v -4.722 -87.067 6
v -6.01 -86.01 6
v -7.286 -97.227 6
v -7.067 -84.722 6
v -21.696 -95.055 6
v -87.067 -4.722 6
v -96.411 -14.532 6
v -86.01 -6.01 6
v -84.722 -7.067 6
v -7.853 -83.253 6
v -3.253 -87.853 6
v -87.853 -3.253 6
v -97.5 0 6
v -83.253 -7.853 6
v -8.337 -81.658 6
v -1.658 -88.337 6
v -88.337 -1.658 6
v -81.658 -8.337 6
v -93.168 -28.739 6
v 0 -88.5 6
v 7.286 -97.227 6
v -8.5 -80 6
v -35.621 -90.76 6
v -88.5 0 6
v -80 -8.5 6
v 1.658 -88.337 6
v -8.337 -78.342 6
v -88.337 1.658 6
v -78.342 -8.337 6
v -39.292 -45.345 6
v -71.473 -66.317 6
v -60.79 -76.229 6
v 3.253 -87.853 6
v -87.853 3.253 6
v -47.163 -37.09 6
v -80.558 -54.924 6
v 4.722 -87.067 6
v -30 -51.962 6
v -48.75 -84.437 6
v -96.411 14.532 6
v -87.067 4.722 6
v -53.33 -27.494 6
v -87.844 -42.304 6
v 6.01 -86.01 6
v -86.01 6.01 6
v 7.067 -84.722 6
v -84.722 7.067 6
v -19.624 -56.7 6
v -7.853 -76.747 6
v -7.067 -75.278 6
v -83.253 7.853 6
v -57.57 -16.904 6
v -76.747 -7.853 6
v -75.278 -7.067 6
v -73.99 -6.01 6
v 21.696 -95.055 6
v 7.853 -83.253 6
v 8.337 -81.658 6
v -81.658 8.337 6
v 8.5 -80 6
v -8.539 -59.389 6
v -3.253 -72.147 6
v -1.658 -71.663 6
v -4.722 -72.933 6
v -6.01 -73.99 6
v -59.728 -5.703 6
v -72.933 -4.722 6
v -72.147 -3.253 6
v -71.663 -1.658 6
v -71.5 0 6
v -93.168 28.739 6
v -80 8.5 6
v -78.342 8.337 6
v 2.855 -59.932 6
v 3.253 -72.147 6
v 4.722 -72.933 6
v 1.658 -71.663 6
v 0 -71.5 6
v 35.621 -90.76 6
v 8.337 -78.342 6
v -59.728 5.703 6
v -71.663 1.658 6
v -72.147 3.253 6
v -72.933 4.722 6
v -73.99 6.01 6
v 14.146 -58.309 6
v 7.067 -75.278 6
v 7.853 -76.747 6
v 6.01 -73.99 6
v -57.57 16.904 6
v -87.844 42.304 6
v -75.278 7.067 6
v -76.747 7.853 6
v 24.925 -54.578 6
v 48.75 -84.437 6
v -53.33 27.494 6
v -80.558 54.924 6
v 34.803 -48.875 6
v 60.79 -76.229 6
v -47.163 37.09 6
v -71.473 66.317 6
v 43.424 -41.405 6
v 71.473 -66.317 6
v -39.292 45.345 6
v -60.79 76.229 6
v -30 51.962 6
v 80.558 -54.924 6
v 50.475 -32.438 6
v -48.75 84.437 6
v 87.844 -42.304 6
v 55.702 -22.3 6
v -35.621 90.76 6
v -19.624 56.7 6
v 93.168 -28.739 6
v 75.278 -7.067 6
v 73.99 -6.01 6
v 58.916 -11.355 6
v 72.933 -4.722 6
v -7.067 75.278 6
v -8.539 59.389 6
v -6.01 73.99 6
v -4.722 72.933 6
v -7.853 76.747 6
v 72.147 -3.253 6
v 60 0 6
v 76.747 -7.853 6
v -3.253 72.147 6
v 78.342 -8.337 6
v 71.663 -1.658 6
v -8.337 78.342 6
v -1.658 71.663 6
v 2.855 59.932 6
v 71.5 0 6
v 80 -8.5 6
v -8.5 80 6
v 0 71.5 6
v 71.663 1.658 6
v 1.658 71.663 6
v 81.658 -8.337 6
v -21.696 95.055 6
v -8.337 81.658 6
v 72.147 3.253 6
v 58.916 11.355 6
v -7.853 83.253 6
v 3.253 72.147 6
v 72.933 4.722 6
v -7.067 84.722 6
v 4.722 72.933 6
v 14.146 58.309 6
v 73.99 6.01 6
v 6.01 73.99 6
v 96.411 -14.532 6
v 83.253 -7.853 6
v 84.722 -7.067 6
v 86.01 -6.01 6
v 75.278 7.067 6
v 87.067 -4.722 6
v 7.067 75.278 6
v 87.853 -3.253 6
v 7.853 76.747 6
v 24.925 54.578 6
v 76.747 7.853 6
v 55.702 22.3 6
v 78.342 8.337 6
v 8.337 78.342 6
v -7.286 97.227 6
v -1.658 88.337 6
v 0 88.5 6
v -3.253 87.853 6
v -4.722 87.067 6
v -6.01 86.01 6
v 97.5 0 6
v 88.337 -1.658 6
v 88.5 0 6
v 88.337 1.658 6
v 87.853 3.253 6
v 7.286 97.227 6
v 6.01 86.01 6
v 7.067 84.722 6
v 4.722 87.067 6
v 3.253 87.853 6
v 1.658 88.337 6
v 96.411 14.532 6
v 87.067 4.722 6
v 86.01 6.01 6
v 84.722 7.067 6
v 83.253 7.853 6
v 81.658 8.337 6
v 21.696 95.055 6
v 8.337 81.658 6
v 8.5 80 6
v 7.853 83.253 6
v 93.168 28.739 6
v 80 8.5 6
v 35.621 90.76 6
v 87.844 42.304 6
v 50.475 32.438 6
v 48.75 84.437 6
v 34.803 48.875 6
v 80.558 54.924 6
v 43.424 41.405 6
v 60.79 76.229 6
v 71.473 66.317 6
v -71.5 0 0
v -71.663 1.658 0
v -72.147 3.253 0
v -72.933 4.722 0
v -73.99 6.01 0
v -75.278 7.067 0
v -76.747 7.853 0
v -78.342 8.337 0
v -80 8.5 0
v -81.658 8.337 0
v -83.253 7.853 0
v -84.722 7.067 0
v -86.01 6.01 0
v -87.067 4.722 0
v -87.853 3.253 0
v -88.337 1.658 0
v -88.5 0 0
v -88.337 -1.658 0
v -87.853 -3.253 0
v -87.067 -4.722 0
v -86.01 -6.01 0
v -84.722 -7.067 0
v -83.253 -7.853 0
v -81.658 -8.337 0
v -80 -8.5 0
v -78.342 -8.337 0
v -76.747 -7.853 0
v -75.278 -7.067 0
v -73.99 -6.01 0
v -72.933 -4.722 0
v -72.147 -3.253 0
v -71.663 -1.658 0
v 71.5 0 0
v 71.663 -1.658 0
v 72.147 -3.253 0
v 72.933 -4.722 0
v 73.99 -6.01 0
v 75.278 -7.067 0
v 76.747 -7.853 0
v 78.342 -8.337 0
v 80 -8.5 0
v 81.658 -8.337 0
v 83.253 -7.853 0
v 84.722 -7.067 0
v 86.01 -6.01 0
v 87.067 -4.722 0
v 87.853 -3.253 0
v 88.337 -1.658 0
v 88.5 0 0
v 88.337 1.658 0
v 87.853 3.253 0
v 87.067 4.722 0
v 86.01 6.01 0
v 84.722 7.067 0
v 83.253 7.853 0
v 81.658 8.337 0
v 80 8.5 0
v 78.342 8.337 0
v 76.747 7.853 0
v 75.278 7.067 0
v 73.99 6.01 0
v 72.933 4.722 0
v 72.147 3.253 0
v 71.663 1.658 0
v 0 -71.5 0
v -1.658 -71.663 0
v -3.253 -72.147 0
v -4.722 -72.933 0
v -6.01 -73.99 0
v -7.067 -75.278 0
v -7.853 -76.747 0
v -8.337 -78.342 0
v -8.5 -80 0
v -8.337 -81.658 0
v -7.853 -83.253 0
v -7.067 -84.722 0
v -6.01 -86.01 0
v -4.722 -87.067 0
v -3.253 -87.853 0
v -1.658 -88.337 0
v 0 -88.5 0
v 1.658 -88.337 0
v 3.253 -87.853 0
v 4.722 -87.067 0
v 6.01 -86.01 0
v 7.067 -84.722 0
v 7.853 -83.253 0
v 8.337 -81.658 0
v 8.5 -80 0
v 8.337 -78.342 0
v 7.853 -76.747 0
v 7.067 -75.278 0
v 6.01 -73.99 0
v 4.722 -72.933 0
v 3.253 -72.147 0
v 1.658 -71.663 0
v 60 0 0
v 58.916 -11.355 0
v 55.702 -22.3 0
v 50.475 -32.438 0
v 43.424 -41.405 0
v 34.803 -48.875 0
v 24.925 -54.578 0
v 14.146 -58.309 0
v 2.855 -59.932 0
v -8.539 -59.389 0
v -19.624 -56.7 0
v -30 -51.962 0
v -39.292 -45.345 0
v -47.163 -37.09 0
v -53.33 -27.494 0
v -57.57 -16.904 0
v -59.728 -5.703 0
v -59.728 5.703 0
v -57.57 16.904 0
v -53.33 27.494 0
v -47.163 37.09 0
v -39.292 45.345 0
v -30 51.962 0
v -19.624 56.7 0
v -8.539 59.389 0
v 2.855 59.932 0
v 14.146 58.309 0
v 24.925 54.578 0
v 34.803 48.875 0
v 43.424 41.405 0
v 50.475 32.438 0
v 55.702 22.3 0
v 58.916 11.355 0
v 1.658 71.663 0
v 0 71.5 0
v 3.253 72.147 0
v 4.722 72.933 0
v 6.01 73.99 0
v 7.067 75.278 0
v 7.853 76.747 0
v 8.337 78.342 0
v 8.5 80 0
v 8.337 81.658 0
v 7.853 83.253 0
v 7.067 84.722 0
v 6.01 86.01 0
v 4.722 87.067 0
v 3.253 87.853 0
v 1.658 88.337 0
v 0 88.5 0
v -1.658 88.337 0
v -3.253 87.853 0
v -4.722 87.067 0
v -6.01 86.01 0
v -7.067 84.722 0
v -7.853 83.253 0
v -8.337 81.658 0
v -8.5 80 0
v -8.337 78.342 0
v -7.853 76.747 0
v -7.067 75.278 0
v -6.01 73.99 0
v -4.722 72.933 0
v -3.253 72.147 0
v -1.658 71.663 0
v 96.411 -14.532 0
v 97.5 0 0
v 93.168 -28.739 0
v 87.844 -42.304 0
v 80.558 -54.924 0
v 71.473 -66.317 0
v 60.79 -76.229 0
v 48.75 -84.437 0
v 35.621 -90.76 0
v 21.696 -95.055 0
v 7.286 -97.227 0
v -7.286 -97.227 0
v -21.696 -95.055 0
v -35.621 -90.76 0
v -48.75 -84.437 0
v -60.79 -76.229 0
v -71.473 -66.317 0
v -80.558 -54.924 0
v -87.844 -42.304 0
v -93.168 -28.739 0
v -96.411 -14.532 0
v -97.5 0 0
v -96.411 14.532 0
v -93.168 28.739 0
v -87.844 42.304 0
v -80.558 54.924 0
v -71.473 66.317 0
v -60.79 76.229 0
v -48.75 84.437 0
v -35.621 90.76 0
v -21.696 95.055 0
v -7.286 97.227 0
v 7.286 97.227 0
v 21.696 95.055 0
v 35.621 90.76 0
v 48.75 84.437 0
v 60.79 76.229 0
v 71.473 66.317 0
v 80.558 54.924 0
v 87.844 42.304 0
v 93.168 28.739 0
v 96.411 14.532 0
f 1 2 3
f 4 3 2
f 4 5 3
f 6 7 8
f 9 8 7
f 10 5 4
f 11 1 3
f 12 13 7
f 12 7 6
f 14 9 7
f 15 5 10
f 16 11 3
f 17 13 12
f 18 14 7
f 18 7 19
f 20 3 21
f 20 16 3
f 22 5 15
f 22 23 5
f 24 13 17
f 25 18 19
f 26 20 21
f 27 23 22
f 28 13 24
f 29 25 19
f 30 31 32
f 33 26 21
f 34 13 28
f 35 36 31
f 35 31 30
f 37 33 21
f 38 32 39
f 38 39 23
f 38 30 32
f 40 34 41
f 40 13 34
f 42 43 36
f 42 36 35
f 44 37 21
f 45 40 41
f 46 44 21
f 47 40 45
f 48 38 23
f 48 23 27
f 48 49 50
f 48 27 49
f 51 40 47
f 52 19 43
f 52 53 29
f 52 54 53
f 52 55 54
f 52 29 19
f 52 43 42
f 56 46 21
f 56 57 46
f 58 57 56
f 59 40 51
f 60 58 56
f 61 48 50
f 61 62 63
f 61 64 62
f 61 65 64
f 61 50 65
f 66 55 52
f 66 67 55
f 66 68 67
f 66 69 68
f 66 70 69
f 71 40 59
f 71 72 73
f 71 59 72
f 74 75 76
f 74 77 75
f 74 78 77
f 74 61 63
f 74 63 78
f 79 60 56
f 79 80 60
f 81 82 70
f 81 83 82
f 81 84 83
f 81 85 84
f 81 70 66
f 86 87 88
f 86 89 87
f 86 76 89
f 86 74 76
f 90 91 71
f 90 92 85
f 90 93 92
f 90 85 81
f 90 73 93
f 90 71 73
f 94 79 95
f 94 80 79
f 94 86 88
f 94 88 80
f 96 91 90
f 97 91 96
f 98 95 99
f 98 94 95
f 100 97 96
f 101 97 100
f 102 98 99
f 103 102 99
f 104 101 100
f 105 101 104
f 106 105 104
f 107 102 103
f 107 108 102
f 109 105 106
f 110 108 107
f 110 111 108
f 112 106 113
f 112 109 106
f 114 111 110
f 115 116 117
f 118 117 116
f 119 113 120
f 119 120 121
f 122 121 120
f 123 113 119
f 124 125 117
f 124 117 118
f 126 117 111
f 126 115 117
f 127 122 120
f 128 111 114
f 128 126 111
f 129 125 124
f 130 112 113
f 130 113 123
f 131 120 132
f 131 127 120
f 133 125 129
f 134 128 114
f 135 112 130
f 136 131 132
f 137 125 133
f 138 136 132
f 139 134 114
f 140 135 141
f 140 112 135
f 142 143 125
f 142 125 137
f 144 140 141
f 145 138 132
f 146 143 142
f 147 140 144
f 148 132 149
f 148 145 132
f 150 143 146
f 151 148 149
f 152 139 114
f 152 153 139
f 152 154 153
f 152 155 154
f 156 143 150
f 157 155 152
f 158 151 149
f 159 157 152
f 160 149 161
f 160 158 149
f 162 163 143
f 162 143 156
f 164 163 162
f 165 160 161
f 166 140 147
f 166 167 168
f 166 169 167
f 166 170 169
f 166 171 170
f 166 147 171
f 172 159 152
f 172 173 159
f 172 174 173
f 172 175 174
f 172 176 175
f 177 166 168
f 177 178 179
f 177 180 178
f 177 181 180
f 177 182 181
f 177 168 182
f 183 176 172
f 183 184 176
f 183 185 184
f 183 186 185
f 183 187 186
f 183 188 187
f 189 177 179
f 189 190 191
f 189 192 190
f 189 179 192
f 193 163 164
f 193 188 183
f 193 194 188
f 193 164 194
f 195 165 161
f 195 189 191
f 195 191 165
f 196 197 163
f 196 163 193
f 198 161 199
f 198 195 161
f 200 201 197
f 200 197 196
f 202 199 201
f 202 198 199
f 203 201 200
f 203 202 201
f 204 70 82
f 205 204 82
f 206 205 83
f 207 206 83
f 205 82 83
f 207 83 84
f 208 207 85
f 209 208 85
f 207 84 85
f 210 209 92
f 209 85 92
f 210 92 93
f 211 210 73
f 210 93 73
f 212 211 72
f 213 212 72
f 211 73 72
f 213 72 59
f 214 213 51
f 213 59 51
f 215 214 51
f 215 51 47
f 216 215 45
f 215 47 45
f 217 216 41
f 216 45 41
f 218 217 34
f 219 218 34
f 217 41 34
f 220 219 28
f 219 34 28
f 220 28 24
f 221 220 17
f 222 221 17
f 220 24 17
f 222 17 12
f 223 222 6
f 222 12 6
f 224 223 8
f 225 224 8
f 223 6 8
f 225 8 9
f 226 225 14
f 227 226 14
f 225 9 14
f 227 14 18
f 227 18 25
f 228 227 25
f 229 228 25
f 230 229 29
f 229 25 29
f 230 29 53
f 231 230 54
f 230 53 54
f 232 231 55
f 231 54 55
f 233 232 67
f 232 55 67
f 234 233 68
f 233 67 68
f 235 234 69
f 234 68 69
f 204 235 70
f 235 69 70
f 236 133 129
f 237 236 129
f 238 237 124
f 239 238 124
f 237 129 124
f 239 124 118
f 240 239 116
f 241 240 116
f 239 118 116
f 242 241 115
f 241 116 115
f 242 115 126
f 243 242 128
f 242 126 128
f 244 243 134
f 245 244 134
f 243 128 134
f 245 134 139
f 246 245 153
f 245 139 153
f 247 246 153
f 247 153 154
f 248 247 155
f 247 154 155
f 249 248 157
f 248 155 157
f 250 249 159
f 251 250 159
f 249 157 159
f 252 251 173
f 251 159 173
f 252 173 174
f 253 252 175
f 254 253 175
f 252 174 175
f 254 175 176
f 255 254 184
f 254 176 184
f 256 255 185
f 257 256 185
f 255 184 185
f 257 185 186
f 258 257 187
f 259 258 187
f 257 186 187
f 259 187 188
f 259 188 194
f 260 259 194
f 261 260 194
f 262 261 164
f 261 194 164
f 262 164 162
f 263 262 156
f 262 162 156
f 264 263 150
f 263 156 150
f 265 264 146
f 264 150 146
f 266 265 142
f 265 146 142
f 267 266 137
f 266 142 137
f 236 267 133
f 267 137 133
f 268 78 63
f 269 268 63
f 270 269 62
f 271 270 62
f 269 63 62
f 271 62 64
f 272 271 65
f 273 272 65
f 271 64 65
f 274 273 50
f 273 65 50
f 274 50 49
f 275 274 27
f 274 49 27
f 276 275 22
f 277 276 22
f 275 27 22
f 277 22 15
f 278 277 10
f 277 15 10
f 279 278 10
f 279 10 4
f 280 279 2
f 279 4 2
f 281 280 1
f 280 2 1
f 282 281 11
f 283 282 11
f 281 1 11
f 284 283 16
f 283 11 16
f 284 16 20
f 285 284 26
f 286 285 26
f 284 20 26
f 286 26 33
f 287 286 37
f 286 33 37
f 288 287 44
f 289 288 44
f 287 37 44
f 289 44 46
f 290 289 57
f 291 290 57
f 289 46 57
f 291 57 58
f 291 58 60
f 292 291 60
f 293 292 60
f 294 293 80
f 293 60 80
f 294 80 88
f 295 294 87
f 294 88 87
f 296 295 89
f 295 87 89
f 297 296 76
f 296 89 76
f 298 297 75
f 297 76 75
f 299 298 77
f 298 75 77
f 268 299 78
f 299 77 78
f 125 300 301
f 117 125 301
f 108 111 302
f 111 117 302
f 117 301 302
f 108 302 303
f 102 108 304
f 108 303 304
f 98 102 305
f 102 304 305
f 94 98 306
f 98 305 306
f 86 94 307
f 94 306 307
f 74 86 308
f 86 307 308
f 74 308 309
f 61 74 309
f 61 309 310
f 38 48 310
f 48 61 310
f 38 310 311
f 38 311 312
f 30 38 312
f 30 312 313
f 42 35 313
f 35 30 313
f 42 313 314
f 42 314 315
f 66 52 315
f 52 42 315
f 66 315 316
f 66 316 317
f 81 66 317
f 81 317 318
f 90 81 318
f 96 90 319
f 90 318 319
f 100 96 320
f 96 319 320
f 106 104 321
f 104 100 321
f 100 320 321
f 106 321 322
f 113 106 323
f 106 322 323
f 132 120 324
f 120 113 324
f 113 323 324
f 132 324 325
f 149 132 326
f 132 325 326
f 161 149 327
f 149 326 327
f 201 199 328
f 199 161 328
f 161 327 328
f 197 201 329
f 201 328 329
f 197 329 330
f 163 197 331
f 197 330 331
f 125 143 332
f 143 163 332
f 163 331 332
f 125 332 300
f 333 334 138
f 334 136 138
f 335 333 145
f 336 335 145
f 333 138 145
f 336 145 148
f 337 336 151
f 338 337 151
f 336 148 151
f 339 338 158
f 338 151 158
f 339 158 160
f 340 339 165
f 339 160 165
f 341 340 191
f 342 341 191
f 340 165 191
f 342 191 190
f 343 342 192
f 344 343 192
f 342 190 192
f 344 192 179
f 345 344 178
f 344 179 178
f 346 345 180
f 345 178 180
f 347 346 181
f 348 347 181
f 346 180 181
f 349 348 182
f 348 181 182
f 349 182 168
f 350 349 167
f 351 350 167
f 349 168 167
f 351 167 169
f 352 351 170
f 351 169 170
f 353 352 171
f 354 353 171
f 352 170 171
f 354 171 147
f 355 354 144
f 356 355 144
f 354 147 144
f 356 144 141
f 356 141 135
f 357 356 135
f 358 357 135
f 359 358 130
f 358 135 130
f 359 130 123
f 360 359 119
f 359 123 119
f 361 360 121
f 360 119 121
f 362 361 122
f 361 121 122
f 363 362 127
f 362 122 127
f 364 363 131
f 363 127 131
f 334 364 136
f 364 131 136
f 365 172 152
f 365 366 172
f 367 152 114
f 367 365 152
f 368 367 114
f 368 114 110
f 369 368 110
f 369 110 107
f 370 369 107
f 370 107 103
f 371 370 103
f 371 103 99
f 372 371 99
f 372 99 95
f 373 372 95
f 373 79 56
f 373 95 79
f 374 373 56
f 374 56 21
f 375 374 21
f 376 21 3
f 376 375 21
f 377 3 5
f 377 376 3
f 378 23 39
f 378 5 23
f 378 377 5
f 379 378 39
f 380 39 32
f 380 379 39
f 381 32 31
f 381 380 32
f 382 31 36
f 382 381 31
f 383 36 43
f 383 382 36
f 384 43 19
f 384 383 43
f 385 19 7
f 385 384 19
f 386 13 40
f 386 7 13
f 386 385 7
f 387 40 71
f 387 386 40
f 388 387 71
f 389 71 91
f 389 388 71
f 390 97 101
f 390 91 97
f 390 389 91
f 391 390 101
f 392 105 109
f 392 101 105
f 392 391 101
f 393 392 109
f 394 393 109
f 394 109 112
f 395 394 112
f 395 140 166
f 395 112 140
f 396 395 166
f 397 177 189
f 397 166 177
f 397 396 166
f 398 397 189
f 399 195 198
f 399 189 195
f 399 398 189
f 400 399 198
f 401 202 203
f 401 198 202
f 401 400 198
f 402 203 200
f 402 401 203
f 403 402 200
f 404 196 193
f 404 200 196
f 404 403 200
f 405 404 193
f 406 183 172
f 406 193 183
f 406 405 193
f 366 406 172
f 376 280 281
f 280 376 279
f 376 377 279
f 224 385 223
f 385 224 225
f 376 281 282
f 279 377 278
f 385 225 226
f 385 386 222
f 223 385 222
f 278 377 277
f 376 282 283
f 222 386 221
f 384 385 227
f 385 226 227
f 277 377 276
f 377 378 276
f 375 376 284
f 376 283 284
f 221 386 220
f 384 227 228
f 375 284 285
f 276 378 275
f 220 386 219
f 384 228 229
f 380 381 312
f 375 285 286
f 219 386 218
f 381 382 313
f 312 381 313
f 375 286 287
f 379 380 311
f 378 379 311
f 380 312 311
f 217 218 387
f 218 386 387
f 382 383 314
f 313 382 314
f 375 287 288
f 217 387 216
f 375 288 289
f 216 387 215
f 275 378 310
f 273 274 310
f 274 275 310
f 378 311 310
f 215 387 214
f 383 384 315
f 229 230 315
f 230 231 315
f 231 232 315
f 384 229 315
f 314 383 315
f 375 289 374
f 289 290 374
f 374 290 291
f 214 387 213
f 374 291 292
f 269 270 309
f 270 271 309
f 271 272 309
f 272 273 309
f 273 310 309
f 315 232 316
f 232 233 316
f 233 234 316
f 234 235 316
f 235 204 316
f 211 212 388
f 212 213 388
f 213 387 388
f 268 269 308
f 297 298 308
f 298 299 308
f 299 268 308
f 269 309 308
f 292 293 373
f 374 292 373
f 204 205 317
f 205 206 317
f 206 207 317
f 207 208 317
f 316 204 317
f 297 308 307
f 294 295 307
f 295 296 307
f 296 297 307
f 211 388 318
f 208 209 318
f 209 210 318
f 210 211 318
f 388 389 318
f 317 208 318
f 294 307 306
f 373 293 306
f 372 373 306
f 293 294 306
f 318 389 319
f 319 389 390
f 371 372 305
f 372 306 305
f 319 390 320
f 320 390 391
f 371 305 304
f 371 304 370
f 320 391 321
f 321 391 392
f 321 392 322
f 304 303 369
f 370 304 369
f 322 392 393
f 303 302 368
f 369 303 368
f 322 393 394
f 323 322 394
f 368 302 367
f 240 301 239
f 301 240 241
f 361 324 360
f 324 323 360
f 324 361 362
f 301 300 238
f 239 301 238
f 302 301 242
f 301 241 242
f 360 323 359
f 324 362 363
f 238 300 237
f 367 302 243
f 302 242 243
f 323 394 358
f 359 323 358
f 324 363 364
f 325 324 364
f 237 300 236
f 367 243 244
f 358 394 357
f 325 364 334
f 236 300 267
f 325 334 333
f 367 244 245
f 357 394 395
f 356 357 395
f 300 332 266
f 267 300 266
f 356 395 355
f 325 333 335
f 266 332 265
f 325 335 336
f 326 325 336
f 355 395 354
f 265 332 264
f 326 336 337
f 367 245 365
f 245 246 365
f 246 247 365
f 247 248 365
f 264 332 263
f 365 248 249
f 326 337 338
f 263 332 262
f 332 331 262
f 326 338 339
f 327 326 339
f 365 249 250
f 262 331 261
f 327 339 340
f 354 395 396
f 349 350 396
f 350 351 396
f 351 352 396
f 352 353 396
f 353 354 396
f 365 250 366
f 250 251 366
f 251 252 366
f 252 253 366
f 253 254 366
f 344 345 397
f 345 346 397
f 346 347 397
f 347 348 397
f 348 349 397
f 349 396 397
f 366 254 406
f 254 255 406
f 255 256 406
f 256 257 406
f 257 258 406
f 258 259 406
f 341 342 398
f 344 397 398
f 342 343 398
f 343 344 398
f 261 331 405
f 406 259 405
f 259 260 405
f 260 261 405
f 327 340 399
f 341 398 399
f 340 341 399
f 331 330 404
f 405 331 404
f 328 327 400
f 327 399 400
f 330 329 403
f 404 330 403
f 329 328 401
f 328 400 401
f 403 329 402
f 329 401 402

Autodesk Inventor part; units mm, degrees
ref_plane "YZ Plane" through (0, 0, 0) normal (1, 0, 0) x (0, 1, 0)
ref_plane "XZ Plane" through (0, 0, 0) normal (0, 1, 0) x (-1, 0, 0)
ref_plane "XY Plane" through (0, 0, 0) normal (0, 0, 1) x (1, 0, 0)
sketch "Sketch2" plane through (0, 0, 0) normal (0, 0, 1) x (1, 0, 0)
  circle A0 centre (0, 0) radius 60
  circle A1 centre (0, 0) radius 97.5
  dimension "d25" = 120
  dimension "d27" = 195
extrude "Plate2" add sketch "Sketch2" along normal blind 6
sketch "Sketch3" plane through (0, 0, 6) normal (0, 0, 1) x (1, 0, 0)
  circle A0 centre (-80, 0) radius 8.5
  circle A1 centre (0, 0) radius 80 construction
  dimension "d28" = 160
  dimension "d15" = 17
extrude "Cut1" cut sketch "Sketch3" against normal blind 6
pattern_circular "Circular Pattern1" count 4 over 360 about axis through (0, 0, -10) along (0, 0, 1) of "Cut1"
equation "\"d17\" = Thickness"
equation "\"d14\" = Thickness"
equation "\"BendReliefWidth\" = Thickness"
equation "\"BendReliefDepth\" = 0.5 * Thickness"
equation "\"CornerReliefSize\" = 4 * Thickness"
equation "\"MinimumRemnant\" = 2 * Thickness"
equation "\"TransitionRadius\" = BendRadius"
equation "\"JacobiRadiusSize\" = BendRadius"
equation "\"GapSize\" = Thickness"
equation "\"Thickness\" = 6"
equation "\"BendRadius\" = 6"
properties part number "PRS 9431 FDS flange DN90_D1200" material "Steel"
